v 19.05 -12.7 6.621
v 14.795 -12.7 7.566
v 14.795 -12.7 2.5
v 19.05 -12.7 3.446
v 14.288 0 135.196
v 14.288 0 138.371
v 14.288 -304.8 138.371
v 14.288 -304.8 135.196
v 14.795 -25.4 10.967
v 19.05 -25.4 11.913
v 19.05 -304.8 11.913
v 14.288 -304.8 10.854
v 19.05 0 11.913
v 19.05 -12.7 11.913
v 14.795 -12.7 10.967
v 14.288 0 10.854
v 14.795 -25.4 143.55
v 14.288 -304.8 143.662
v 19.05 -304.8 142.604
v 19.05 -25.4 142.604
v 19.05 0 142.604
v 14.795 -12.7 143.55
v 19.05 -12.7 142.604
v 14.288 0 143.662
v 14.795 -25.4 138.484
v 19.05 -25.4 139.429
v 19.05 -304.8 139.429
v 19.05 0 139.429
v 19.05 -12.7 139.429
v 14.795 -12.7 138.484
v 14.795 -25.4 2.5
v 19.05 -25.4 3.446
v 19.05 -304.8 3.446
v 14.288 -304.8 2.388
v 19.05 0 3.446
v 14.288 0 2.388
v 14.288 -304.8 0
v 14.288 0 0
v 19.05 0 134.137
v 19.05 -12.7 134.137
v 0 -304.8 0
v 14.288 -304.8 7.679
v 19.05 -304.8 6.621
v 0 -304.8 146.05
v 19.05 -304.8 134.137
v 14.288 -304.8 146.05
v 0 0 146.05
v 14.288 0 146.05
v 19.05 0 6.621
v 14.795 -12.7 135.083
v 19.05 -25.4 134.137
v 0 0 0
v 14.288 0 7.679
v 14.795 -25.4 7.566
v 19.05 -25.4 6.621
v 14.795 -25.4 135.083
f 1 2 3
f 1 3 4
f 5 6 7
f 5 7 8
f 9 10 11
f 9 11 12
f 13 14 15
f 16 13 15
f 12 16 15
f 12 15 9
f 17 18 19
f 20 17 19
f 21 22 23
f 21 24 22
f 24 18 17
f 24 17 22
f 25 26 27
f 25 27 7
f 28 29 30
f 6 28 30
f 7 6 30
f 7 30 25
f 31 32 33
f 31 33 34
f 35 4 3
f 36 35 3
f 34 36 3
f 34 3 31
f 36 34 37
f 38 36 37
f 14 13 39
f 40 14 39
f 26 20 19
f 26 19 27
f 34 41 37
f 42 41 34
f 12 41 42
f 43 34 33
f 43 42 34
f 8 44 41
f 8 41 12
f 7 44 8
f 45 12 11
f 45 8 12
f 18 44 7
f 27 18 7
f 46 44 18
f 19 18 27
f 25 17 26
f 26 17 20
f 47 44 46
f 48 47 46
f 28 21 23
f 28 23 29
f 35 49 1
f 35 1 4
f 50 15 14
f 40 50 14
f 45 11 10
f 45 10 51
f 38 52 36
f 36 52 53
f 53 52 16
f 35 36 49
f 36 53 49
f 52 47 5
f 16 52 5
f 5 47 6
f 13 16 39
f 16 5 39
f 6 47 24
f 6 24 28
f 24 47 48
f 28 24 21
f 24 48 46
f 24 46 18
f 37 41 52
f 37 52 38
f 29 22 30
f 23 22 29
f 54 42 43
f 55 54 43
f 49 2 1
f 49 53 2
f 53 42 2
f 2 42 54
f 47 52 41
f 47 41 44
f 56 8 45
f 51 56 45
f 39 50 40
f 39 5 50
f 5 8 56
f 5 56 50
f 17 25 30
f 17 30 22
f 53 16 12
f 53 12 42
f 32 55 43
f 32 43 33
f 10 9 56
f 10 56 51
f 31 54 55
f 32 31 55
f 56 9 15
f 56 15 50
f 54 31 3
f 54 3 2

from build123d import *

# Parameters (mm, degrees)
F0_W     = 19.05
F0_H     = 146.05
F1_DEPTH = 304.8
F4_DEPTH = 304.8
F6_DEPTH = 304.8
F7_W     = 12.7
F7_H     = 146.05
F8_DEPTH = 12.7


with BuildPart() as f1:
    # F0 (on Front) → F1 (new body)
    with BuildSketch(Plane.XZ):
        with Locations((9.525, 73.025)):
            Rectangle(F0_W, F0_H)
    extrude(amount=F1_DEPTH)

    # F3 (on Front) → F4 (cut)
    with BuildSketch(Plane.XZ):
        Polygon((19.05, 124.6124), (24.139026, 124.6124), (24.139026, 153.1874), (14.2875, 153.1874), (14.2875, 143.6624), (19.05, 142.604067), (19.05, 139.429067), (14.2875, 138.370733), (14.2875, 135.195733), (19.05, 134.1374), align=None)
    extrude(amount=F4_DEPTH, mode=Mode.SUBTRACT)

    # F5 (on Front) → F6 (cut)
    with BuildSketch(Plane.XZ):
        Polygon((24.139026, -7.1374), (24.139026, 21.4376), (19.05, 21.4376), (19.05, 11.9126), (14.2875, 10.854267), (14.2875, 7.679267), (19.05, 6.620933), (19.05, 3.445933), (14.2875, 2.3876), (14.2875, -7.1374), align=None)
    extrude(amount=F6_DEPTH, mode=Mode.SUBTRACT)

    # F7 (on offset) → F8 (cut)
    with BuildSketch(Plane.XZ.offset(25.4)):
        with Locations((21.1455, 73.025)):
            Rectangle(F7_W, F7_H)
    extrude(amount=-F8_DEPTH, mode=Mode.SUBTRACT)


solid = f1.part
